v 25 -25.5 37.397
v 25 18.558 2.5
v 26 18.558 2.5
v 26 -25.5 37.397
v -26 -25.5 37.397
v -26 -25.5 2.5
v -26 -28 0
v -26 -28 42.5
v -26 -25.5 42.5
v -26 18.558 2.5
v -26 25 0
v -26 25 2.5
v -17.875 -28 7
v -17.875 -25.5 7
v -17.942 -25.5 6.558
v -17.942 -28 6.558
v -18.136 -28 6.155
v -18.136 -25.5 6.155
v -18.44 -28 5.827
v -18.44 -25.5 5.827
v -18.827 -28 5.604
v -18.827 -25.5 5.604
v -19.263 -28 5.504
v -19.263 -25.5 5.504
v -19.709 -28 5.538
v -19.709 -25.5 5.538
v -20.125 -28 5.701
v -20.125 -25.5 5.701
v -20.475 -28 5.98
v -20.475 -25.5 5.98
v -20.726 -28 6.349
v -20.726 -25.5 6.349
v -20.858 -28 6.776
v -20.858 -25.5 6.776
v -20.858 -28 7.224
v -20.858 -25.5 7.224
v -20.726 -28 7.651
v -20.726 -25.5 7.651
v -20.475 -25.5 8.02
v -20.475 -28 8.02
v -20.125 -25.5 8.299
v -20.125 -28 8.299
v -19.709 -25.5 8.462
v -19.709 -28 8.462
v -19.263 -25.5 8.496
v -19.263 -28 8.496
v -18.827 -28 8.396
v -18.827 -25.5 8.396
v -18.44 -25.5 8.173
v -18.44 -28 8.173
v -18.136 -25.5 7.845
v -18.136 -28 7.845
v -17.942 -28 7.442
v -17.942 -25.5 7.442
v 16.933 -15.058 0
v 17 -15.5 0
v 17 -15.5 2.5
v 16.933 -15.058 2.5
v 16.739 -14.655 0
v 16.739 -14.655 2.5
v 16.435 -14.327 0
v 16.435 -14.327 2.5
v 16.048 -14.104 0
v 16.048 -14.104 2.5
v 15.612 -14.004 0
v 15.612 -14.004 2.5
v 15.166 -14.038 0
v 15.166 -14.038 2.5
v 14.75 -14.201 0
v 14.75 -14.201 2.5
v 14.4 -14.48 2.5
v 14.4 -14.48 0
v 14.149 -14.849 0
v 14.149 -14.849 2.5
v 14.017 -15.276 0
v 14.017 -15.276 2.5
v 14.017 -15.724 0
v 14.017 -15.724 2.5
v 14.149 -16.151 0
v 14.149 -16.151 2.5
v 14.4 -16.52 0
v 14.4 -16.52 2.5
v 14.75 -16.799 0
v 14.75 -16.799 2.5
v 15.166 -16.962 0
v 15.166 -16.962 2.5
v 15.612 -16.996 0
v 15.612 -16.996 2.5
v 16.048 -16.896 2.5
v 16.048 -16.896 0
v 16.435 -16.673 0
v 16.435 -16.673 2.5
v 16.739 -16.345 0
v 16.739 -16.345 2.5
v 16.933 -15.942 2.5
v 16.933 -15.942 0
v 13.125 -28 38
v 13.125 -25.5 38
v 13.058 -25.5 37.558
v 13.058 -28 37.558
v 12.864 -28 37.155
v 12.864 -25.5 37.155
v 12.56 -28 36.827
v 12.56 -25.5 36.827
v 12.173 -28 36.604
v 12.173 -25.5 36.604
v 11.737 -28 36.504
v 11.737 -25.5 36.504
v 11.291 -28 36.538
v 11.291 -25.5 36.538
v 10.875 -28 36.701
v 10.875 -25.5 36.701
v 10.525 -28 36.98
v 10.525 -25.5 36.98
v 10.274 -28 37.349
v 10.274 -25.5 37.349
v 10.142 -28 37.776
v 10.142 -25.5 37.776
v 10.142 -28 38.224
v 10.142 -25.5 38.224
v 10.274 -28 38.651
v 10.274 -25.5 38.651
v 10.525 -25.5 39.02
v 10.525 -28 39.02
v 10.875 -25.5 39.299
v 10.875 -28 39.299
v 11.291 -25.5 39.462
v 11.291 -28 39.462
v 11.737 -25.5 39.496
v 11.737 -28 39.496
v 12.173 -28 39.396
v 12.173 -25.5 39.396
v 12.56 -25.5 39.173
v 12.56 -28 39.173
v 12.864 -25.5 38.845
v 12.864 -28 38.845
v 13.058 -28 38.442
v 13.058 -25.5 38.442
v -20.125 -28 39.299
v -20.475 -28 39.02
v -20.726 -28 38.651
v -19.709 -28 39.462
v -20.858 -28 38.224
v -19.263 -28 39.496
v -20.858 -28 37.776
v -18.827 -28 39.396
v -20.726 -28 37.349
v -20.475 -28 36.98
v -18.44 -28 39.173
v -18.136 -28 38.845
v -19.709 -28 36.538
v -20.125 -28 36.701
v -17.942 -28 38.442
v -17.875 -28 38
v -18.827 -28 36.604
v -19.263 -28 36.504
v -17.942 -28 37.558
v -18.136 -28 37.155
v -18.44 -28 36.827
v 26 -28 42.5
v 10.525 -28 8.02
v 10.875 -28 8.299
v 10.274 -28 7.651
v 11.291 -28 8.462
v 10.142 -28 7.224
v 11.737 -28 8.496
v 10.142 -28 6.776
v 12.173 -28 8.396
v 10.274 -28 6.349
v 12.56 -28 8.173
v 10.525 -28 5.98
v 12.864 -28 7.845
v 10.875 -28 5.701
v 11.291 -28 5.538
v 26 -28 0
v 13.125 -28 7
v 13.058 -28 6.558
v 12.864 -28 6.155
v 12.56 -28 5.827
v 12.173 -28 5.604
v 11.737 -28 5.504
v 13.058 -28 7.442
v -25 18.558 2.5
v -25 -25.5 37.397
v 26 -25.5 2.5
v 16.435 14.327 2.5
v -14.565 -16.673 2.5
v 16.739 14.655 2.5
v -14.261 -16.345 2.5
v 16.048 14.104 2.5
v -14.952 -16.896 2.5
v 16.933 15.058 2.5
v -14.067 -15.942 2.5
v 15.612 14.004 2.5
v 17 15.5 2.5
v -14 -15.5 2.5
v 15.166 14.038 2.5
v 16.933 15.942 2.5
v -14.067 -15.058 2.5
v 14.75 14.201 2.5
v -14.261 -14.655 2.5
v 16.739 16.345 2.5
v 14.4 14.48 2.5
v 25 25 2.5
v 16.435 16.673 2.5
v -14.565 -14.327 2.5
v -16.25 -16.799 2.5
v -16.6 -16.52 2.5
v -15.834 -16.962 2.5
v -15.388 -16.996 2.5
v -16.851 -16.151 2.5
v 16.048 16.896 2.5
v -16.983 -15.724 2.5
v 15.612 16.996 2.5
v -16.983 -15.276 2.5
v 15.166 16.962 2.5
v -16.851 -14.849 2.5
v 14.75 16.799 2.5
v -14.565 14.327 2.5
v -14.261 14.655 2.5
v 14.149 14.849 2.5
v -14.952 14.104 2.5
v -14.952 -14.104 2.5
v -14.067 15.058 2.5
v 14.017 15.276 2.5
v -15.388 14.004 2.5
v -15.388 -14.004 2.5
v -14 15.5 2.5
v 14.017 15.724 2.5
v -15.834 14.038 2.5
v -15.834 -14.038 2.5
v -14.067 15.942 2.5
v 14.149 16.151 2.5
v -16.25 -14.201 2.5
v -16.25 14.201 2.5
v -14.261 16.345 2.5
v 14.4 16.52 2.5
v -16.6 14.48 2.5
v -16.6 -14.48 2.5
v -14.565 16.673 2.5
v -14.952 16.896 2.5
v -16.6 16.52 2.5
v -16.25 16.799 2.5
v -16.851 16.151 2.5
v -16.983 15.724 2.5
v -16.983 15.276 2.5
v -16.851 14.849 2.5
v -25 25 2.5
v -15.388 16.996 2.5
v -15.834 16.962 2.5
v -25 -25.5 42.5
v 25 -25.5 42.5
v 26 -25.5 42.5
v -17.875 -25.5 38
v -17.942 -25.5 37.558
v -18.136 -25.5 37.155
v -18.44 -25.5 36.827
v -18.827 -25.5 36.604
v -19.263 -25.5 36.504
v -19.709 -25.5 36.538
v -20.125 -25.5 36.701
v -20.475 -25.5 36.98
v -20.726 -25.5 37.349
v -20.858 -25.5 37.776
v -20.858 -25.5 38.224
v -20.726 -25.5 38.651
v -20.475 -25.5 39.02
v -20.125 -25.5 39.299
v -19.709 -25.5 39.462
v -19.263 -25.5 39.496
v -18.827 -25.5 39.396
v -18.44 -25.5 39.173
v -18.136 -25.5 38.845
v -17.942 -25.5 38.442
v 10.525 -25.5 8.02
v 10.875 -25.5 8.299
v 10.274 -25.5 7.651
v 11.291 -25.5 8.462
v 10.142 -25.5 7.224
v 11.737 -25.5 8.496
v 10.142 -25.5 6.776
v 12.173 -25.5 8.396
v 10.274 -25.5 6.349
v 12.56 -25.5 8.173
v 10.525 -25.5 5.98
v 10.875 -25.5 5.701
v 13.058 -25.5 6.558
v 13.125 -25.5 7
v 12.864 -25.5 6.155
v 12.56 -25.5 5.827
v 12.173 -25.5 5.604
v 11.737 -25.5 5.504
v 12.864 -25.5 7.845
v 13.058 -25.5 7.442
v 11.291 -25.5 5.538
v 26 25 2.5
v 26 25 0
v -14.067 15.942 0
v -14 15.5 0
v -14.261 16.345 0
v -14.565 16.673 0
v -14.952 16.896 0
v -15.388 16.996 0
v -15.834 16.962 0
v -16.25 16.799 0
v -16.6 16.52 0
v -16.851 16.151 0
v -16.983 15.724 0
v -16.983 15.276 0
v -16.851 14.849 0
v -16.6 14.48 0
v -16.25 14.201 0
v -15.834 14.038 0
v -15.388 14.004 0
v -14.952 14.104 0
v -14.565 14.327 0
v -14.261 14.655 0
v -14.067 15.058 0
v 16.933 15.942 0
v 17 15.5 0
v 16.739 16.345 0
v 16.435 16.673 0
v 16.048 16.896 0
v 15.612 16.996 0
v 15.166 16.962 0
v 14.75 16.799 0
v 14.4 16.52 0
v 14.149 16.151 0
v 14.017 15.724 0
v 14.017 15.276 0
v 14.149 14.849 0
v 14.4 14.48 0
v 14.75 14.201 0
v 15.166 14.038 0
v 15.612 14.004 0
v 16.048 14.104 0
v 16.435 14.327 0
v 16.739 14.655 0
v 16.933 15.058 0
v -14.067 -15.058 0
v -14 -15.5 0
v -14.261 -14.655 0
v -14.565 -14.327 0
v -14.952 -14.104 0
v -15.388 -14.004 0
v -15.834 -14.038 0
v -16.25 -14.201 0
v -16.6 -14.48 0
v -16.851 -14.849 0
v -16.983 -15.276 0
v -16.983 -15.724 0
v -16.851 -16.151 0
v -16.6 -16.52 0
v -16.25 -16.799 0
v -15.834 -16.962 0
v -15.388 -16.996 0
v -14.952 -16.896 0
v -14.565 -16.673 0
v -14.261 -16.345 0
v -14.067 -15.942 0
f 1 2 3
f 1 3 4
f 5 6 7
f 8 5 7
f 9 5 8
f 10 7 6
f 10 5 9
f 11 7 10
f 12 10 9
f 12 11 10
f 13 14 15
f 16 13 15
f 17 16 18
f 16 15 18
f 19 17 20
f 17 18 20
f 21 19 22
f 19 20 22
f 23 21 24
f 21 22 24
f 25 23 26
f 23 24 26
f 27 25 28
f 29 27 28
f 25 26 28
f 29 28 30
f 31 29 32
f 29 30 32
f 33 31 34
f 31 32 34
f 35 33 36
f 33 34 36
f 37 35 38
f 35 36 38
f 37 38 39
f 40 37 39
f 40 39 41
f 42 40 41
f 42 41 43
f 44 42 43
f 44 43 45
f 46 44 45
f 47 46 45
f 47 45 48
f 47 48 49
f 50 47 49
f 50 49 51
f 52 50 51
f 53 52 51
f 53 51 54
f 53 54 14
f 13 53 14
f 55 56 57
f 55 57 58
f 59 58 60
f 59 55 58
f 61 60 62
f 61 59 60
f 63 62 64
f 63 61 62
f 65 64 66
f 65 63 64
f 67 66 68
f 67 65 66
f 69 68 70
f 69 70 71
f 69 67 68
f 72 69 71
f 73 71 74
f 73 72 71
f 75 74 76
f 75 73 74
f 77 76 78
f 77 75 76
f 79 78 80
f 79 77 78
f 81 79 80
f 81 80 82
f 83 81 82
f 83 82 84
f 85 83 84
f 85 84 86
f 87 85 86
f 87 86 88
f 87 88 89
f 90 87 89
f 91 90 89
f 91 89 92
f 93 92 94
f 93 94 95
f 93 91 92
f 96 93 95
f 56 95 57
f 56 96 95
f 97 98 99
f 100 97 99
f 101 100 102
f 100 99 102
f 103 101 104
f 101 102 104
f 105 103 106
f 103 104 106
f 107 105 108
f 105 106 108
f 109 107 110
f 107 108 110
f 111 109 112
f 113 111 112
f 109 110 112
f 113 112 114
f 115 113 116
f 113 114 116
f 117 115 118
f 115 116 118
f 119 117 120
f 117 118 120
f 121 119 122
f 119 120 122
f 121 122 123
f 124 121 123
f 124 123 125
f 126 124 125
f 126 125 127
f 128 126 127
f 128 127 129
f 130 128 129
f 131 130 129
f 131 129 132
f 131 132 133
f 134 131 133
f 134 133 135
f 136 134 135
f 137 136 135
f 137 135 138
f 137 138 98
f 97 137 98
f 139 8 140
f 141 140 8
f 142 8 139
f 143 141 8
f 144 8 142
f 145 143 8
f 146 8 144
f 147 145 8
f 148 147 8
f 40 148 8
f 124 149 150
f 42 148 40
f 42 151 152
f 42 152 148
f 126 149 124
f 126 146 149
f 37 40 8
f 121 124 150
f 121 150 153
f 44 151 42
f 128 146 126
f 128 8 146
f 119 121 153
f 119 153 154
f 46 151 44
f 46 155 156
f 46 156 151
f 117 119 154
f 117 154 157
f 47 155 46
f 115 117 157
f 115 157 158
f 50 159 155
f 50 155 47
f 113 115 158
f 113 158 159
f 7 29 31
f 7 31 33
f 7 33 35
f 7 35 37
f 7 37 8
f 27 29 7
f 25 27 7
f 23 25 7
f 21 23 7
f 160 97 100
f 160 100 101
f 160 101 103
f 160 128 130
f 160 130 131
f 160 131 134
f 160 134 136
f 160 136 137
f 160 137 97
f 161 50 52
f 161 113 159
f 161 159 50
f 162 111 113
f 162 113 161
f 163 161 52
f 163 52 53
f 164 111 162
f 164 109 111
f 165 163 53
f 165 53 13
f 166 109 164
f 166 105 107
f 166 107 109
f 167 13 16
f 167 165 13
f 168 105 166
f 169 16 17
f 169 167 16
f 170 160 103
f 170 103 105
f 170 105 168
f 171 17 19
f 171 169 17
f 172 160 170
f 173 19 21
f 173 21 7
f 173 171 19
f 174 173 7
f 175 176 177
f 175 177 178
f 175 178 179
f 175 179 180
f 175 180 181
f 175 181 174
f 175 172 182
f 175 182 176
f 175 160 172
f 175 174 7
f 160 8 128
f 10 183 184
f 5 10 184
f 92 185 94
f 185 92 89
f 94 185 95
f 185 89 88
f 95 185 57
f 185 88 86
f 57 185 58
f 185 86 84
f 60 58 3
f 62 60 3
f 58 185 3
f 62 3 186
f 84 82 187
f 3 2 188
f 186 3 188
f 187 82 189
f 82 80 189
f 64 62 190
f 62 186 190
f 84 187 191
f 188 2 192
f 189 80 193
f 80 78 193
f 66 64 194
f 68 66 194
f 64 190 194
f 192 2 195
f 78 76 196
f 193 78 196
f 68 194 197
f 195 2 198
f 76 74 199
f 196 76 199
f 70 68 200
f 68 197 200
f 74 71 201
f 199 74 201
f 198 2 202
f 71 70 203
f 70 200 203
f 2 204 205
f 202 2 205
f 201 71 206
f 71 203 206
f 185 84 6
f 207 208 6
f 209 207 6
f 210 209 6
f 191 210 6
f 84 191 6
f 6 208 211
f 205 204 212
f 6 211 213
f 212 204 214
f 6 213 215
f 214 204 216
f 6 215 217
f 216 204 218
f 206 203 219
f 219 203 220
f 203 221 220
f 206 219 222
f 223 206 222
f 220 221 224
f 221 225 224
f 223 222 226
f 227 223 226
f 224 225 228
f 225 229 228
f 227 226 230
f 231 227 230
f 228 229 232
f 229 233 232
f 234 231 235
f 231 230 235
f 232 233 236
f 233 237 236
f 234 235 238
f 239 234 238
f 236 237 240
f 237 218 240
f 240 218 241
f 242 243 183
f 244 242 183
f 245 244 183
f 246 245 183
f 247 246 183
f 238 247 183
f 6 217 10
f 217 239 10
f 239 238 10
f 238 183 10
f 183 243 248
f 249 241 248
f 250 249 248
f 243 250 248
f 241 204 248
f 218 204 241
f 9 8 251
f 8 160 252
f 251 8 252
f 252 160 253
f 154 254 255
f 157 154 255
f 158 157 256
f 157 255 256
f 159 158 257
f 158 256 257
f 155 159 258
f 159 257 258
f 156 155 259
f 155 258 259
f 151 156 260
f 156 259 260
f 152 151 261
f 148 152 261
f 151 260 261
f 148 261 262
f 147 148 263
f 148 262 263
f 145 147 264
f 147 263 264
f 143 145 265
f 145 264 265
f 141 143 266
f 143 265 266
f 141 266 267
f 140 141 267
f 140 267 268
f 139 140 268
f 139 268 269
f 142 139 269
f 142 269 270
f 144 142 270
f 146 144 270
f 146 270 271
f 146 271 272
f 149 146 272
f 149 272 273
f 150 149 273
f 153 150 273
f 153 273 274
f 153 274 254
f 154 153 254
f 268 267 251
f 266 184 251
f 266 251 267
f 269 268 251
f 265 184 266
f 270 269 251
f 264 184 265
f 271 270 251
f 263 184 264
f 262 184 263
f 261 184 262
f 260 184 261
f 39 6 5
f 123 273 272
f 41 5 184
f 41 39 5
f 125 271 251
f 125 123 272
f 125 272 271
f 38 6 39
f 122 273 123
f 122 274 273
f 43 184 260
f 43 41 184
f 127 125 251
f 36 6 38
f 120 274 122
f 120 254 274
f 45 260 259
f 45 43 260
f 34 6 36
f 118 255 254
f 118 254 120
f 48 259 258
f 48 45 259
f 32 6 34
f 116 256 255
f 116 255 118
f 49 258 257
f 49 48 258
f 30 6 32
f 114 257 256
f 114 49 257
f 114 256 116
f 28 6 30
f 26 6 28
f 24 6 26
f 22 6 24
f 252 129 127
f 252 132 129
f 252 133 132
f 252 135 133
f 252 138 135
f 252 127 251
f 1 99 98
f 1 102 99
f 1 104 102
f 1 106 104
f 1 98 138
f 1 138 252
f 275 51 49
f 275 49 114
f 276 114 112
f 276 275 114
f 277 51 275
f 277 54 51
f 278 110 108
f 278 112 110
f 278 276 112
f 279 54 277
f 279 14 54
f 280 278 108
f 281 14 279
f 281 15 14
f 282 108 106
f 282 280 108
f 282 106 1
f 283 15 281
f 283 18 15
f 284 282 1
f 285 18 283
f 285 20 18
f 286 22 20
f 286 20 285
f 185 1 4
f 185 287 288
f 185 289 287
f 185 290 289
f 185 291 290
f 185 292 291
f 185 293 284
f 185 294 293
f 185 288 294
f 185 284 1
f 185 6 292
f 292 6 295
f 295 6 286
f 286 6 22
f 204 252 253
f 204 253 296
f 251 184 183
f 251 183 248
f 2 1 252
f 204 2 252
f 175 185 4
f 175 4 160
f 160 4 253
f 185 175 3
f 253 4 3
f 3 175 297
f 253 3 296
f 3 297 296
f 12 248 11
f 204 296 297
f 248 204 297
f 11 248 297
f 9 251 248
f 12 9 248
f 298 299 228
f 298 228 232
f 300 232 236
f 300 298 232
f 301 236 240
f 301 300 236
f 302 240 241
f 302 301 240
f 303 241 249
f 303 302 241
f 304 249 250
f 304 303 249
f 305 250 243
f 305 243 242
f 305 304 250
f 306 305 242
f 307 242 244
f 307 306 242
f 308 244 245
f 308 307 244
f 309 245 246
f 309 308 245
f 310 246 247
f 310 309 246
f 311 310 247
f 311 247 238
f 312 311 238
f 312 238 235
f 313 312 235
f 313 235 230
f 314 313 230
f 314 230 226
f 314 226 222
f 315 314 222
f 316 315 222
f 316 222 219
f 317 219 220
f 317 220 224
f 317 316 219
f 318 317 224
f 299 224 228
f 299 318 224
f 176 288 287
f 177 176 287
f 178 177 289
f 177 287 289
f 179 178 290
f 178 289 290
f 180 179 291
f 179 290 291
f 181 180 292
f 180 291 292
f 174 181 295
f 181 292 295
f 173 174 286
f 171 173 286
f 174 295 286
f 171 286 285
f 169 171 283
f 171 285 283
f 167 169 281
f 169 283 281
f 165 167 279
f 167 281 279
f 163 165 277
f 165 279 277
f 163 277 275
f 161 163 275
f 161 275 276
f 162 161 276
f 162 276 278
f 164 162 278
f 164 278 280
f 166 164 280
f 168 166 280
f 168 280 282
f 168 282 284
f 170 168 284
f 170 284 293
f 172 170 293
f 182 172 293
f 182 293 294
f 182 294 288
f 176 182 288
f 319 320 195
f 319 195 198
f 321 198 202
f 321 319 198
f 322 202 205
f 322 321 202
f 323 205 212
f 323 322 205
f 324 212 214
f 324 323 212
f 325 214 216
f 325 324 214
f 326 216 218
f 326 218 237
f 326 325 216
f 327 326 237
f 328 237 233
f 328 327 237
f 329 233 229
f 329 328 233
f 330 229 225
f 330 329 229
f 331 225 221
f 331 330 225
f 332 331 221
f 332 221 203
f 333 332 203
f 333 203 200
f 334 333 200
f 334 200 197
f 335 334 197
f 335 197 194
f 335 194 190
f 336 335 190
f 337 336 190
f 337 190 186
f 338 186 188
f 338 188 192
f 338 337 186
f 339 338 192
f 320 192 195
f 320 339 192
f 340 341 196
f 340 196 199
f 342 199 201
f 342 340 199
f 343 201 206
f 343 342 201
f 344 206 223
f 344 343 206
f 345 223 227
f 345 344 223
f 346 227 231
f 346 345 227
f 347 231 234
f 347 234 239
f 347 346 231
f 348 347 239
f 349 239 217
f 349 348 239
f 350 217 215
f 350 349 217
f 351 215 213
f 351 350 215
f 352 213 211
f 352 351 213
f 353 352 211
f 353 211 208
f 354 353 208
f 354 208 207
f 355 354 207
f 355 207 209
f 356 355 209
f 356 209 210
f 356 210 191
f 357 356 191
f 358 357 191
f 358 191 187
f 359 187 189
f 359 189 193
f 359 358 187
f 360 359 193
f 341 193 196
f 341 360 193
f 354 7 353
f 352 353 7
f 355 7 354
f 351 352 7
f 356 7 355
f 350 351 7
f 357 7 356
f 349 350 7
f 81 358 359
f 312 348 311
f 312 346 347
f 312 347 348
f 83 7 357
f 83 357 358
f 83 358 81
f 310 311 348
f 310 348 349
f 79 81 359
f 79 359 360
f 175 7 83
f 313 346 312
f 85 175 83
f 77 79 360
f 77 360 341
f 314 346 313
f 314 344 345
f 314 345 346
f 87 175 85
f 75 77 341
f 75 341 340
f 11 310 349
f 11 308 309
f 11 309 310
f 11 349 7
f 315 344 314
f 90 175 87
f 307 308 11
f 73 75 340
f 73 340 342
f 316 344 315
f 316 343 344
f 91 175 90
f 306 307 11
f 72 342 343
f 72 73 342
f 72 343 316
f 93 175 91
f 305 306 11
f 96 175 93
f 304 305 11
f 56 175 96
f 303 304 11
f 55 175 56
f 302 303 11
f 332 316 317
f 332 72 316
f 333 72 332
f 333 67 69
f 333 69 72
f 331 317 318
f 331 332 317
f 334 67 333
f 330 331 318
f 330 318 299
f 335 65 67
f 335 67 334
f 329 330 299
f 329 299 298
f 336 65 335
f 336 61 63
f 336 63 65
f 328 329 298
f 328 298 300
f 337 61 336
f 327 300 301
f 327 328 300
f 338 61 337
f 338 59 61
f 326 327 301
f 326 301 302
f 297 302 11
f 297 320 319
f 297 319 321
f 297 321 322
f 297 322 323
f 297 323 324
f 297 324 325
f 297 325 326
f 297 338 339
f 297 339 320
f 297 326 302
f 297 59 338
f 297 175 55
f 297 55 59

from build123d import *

# Parameters (mm, degrees)
SKETCH1_R           = 1.5
BOSS_EXTRUDE1_DEPTH = 2.5
SKETCH2_W           = 50
SKETCH2_H           = 2.5
BOSS_EXTRUDE2_DEPTH = 40
SKETCH3_R           = 1.5
CUT_EXTRUDE1_DEPTH  = 40
BOSS_EXTRUDE3_DEPTH = 1


with BuildPart() as part:
    # Sketch1 → Boss-Extrude1 (new body)
    with BuildSketch(Plane.XY):
        Polygon((-25, -25), (-25, 25), (25, 25), (25, -25), (25, -28), (-25, -28), align=None)
        with Locations((-15.5, 15.5)):
            Circle(SKETCH1_R, mode=Mode.SUBTRACT)
        with Locations((15.5, 15.5)):
            Circle(SKETCH1_R, mode=Mode.SUBTRACT)
        with Locations((15.5, -15.5)):
            Circle(SKETCH1_R, mode=Mode.SUBTRACT)
        with Locations((-15.5, -15.5)):
            Circle(SKETCH1_R, mode=Mode.SUBTRACT)
    extrude(amount=BOSS_EXTRUDE1_DEPTH)

    # Sketch2 → Boss-Extrude2 (add)
    with BuildSketch(Plane.XY.offset(2.5)):
        with Locations((0, -26.75)):
            Rectangle(SKETCH2_W, SKETCH2_H)
    extrude(amount=BOSS_EXTRUDE2_DEPTH)

    # Sketch3 → Cut-Extrude1 (cut)
    with BuildSketch(Plane(origin=(0, -25.5, 0), x_dir=(1, 0, 0), z_dir=(0, 1, 0))):
        with Locations((-19.375, -7)):
            Circle(SKETCH3_R)
        with Locations((11.625, -7)):
            Circle(SKETCH3_R)
        with Locations((11.625, -38)):
            Circle(SKETCH3_R)
        with Locations((-19.375, -38)):
            Circle(SKETCH3_R)
    extrude(amount=-CUT_EXTRUDE1_DEPTH, mode=Mode.SUBTRACT)

    # Sketch5 → Boss-Extrude3 (add)
    with BuildSketch(Plane(origin=(25, 0, 0), x_dir=(0, 0, -1), z_dir=(1, 0, 0))):
        Polygon((-42.5, -25.5), (-2.5, 25), (0, 25), (0, 16.843145751), (0, -28), (-39.343145751, -28), (-42.5, -28), align=None)
        Polygon((-2.5, 18.557756602), (-37.397232952, -25.5), (-2.5, -25.5), align=None, mode=Mode.SUBTRACT)
    boss_extrude3 = extrude(amount=BOSS_EXTRUDE3_DEPTH)

    # Mirror1: Boss-Extrude3 across plane
    add(boss_extrude3.mirror(Plane(origin=(0, 0, 0), x_dir=(0, 0, 1), z_dir=(1, 0, 0))))


solid = part.part
